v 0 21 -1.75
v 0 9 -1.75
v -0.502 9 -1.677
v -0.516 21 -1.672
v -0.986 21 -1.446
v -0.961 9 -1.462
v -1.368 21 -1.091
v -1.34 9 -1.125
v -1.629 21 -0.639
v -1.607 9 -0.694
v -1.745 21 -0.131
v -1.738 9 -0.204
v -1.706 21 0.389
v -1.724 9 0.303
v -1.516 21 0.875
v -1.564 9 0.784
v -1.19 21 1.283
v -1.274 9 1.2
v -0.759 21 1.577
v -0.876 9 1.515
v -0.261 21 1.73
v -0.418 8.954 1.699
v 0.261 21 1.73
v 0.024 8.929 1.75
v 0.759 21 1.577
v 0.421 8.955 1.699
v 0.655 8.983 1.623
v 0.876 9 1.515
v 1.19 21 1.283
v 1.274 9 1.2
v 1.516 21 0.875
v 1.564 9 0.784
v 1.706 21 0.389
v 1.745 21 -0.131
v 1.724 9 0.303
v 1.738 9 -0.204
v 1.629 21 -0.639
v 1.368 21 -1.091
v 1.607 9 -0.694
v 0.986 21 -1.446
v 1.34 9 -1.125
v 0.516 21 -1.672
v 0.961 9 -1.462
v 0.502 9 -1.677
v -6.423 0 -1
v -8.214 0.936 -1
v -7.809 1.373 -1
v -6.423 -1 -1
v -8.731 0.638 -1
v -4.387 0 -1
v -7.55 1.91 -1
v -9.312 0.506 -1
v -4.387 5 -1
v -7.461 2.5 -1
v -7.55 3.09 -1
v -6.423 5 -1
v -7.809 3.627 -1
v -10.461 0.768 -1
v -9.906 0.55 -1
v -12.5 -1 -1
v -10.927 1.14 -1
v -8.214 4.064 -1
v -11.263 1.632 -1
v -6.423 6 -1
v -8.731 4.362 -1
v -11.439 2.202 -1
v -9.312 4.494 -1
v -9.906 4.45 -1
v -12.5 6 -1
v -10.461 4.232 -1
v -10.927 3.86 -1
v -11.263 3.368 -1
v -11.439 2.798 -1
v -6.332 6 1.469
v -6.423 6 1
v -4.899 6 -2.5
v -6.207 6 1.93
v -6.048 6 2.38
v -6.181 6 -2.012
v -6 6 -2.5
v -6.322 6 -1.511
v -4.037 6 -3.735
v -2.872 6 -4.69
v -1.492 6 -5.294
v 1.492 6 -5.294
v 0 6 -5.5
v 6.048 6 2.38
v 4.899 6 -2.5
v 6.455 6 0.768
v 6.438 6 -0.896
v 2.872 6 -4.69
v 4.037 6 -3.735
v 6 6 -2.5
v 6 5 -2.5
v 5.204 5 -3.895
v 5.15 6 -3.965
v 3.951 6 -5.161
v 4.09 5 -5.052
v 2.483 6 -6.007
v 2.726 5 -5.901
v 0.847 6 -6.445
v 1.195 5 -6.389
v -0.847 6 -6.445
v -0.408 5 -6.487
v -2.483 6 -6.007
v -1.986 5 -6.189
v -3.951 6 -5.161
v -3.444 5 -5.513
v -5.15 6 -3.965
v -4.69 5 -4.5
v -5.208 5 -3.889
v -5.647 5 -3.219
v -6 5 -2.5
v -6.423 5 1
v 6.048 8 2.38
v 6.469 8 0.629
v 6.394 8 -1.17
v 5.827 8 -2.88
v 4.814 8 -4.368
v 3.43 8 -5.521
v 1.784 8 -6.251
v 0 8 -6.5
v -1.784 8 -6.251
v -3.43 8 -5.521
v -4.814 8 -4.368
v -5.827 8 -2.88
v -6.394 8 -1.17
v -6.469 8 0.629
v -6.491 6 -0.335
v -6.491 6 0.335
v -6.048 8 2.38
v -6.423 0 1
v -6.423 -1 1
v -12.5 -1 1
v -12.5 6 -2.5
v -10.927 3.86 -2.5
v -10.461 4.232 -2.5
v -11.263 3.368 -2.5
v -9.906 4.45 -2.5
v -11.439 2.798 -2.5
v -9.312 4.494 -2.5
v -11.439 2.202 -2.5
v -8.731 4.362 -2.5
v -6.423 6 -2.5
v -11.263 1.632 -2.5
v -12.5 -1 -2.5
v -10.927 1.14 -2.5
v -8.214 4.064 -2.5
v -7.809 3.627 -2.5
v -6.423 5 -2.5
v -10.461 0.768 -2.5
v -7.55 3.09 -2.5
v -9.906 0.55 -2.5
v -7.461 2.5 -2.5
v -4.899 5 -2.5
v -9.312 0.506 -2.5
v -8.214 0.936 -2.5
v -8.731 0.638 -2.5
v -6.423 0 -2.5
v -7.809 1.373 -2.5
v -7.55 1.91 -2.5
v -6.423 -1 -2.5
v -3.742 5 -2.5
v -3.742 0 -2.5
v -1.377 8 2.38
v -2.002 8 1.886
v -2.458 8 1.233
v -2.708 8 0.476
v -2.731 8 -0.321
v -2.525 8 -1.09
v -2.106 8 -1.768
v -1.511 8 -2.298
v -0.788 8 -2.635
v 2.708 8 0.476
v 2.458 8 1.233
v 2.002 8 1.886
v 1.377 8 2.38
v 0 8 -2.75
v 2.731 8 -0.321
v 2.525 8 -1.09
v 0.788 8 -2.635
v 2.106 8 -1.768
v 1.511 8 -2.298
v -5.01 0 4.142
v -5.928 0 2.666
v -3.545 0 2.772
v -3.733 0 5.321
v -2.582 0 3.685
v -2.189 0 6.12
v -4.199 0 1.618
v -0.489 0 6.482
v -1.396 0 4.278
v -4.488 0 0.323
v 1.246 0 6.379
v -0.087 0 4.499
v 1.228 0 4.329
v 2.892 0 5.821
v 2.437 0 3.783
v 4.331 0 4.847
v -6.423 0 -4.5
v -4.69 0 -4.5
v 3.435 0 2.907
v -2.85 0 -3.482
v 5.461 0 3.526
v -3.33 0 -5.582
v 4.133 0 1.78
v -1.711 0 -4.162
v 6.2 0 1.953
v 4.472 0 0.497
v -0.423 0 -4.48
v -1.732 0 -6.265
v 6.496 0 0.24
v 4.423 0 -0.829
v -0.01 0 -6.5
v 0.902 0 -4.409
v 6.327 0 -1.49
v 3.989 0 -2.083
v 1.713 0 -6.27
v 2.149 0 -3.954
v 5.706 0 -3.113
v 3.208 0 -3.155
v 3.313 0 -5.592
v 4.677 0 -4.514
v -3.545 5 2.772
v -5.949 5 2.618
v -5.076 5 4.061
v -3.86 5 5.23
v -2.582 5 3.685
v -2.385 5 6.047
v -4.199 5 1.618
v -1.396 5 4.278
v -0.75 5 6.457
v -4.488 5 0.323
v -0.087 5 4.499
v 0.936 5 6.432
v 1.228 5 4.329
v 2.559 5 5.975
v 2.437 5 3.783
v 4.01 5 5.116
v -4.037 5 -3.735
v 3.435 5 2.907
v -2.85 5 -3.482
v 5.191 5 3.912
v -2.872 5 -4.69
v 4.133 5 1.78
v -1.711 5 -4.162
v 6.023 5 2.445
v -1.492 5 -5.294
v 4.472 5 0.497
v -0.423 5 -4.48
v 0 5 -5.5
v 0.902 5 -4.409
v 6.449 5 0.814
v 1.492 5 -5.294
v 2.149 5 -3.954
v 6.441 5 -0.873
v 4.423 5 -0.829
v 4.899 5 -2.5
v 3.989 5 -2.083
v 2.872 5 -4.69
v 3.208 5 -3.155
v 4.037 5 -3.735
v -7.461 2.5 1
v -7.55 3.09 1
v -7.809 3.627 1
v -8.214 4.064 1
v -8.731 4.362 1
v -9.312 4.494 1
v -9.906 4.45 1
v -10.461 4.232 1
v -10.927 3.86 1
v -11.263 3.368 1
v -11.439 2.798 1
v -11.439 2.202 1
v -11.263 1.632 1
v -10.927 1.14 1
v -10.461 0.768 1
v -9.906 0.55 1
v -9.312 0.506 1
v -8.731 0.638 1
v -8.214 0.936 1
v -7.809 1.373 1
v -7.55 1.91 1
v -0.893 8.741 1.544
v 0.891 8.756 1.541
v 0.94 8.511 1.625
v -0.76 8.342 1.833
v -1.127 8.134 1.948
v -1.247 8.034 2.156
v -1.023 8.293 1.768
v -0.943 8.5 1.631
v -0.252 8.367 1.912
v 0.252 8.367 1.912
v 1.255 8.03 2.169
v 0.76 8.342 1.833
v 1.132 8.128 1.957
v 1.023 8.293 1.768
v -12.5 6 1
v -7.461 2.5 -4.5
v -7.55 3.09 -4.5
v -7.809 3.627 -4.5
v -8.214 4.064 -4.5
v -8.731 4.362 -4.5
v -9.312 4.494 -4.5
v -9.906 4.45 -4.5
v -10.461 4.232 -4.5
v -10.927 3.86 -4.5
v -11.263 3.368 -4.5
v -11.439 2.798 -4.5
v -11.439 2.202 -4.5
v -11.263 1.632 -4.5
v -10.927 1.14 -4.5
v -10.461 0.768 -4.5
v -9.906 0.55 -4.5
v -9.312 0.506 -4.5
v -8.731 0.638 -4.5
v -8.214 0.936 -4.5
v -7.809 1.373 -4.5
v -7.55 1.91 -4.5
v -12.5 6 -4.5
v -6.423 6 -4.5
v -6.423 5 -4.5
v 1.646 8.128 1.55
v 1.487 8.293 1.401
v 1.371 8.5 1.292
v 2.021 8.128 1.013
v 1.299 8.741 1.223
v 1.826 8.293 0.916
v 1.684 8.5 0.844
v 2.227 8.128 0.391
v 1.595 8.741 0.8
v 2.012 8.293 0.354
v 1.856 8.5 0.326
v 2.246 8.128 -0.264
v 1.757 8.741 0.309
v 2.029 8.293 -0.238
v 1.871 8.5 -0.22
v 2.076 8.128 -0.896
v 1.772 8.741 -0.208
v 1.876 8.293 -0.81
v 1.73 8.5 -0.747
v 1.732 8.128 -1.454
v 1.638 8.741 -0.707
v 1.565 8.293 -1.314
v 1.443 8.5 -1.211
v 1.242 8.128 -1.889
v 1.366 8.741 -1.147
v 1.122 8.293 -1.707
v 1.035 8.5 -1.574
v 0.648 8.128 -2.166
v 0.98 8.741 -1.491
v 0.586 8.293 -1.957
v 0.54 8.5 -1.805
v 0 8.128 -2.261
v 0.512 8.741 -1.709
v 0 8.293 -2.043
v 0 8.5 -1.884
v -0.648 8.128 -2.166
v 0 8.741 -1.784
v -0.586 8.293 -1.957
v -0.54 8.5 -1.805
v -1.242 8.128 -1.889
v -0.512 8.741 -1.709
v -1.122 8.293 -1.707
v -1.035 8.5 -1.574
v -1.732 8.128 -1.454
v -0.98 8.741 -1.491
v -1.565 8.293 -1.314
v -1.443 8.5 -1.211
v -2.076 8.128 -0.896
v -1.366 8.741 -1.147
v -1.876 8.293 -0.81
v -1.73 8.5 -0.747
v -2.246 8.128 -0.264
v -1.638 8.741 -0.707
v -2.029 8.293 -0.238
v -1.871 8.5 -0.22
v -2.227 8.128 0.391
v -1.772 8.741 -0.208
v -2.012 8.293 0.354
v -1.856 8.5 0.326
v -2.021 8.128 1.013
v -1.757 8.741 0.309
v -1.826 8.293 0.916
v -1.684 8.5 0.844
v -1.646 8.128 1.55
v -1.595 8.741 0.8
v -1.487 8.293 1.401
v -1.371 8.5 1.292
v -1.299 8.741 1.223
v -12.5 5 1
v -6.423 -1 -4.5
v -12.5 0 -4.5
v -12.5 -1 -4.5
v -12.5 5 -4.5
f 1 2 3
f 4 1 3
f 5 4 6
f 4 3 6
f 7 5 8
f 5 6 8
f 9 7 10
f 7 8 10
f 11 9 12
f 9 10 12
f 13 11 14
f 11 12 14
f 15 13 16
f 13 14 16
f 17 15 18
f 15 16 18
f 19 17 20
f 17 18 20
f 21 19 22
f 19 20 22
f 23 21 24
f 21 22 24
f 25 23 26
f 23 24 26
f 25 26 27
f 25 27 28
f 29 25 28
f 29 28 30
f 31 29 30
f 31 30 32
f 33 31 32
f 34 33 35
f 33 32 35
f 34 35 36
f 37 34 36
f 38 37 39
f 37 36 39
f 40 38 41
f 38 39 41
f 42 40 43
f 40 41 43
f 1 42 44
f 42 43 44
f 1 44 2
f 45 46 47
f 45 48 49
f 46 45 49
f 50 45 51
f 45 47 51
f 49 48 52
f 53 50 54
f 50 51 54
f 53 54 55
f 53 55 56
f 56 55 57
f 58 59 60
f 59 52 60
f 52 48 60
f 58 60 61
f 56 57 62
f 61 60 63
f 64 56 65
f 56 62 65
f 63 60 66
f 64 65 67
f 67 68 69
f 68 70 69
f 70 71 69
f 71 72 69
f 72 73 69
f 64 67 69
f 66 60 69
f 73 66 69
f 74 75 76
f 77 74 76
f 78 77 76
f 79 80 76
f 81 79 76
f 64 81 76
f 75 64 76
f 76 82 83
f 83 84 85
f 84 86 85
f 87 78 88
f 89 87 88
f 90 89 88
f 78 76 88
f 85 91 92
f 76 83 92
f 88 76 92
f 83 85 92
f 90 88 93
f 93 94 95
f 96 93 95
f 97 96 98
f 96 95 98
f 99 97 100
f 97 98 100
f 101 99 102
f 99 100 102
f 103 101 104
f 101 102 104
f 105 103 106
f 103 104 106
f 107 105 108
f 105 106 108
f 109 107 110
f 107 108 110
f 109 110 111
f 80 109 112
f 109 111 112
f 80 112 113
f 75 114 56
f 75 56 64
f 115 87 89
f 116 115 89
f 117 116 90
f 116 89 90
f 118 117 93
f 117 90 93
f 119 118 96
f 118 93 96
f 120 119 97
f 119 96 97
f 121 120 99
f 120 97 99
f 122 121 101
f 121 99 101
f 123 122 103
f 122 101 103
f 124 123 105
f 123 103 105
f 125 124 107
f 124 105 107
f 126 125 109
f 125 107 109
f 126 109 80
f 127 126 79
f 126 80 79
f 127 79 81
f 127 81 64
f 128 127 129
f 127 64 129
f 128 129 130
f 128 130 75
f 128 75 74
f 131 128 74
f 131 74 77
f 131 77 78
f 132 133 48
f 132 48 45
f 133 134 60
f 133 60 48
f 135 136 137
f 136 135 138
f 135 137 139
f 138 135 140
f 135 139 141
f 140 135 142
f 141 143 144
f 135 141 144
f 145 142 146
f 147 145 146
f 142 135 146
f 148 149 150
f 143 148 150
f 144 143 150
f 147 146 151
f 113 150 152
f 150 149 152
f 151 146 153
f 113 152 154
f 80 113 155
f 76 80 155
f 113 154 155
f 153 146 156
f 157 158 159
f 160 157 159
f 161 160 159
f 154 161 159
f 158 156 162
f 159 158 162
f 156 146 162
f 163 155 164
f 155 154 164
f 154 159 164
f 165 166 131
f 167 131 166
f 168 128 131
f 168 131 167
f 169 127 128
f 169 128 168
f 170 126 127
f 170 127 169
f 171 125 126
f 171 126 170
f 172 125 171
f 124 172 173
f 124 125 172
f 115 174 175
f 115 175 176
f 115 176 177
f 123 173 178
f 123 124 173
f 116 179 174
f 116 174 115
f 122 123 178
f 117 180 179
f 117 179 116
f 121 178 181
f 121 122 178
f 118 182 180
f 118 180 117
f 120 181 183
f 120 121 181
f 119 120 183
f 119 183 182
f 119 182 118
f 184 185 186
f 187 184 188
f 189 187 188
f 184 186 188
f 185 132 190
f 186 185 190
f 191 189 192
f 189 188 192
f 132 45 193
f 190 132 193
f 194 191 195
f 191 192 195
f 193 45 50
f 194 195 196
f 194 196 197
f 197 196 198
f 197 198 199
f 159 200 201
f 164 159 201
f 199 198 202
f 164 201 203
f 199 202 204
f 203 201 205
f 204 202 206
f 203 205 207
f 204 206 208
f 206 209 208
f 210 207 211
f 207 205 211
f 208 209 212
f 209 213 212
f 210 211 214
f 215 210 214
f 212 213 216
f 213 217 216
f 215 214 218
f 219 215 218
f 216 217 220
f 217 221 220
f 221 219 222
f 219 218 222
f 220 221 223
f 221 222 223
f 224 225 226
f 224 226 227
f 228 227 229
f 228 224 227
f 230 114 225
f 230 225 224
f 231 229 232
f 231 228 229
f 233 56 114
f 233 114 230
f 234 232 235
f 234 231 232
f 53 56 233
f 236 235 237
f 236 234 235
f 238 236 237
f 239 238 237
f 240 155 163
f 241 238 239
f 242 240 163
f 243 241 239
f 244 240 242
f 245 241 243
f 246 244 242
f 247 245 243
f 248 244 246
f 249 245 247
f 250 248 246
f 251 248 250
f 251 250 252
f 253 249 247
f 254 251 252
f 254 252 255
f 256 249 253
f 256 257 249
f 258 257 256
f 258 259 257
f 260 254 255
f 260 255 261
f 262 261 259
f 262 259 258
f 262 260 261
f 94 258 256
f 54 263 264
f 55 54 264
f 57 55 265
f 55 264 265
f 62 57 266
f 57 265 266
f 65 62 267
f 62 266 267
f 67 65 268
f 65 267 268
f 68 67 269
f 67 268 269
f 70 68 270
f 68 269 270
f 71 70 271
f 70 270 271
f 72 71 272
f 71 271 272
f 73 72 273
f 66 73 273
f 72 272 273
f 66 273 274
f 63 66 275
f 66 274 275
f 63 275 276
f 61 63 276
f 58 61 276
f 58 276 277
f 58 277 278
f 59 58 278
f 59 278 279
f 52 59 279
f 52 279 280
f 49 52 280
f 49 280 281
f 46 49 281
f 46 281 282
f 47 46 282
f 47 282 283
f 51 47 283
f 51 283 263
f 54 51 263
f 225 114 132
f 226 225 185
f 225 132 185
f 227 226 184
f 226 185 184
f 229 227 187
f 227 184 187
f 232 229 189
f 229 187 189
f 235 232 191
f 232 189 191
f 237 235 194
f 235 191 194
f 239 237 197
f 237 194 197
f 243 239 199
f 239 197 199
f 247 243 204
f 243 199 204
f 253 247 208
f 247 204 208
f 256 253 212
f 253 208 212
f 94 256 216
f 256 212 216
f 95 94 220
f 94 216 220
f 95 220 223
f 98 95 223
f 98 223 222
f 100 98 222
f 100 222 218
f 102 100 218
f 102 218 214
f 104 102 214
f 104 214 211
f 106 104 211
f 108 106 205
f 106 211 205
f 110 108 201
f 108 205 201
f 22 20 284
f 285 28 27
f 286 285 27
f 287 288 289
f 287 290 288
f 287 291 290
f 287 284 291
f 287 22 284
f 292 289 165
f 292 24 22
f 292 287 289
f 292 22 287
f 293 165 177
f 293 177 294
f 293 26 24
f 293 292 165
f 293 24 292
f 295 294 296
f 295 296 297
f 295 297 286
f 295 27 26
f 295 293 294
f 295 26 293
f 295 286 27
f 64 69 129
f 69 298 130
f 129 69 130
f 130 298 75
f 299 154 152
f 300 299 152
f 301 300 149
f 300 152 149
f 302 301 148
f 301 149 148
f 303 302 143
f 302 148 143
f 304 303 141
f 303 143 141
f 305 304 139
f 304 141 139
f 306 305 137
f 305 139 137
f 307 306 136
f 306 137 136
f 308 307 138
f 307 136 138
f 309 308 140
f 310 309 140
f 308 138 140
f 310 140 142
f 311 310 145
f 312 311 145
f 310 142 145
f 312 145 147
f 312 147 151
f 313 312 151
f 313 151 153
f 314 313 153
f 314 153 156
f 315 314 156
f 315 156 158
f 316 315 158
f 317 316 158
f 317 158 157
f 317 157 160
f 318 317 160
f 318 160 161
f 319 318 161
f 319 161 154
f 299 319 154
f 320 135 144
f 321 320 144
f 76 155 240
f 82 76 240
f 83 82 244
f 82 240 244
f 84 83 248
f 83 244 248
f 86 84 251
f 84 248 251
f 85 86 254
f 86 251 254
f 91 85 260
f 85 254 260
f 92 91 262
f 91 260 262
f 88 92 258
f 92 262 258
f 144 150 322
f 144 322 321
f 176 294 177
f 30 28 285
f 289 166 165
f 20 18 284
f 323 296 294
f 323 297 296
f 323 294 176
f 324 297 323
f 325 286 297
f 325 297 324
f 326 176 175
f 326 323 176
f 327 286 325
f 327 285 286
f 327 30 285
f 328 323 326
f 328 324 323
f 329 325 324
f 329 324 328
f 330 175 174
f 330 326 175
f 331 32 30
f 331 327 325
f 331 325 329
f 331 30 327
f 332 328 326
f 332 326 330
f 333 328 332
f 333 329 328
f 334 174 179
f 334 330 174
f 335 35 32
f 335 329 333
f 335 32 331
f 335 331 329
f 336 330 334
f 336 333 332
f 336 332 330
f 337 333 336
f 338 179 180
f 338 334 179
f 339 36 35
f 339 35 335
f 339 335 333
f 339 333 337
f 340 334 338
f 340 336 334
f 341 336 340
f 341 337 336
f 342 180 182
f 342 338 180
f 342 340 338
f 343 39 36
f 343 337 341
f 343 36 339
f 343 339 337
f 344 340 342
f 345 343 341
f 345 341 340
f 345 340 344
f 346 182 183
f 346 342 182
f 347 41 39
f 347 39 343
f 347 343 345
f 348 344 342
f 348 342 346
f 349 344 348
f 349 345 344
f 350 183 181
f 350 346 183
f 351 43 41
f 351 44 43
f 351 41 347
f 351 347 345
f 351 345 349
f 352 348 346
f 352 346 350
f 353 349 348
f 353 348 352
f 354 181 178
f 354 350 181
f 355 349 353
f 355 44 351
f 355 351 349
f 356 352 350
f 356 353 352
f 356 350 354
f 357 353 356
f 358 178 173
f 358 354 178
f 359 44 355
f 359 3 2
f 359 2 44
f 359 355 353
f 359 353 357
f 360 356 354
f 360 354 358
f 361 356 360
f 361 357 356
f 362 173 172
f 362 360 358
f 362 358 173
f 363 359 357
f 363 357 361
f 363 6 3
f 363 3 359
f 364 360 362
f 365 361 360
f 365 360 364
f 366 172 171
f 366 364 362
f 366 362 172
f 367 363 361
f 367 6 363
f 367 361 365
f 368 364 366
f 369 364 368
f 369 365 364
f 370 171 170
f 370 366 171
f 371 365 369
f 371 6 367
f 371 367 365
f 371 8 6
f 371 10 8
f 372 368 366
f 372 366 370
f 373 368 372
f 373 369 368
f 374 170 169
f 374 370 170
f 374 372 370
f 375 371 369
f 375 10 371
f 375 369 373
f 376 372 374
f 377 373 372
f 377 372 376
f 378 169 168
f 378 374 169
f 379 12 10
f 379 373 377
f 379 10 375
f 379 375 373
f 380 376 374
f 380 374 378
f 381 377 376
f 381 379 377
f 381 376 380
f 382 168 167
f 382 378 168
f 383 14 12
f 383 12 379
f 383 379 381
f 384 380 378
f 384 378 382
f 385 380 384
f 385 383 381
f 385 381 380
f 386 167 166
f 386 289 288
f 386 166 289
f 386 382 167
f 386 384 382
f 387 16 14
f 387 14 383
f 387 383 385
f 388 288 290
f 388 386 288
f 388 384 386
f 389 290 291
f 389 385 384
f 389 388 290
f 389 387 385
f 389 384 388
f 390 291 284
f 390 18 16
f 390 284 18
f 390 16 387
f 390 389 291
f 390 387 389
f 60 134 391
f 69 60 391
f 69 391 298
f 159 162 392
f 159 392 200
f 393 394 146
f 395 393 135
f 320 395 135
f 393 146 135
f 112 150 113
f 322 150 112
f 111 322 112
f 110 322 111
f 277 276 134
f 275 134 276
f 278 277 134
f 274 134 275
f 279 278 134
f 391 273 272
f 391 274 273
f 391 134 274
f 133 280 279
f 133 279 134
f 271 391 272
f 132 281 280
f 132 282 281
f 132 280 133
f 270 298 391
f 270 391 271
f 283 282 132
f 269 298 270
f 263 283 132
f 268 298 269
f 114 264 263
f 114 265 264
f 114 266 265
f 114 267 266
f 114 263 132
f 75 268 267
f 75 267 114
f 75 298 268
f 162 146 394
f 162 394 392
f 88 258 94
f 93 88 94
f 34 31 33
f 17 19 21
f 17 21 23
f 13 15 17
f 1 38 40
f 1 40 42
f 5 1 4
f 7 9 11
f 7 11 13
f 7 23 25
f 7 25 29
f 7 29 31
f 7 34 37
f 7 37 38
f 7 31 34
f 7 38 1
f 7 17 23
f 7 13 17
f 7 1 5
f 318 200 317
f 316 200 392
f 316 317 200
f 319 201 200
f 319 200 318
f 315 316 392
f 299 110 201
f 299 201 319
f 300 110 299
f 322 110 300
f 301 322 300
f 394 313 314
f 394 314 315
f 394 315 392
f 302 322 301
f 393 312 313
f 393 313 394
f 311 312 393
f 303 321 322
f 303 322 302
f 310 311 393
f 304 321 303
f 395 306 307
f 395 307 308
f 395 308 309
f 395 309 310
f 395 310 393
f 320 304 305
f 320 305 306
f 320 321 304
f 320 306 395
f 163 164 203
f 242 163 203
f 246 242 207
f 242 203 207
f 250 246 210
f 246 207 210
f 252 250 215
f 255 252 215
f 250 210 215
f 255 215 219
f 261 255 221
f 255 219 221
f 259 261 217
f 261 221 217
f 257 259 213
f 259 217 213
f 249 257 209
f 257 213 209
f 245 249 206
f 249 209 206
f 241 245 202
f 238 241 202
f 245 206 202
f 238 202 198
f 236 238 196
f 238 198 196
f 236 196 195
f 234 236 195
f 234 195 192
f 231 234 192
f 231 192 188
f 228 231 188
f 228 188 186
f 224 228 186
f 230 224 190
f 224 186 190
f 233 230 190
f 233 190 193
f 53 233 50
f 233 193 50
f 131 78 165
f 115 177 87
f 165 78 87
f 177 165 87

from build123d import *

# Parameters (mm, degrees)
BOSS_EXTRUDE1_DEPTH = 5
BOSS_EXTRUDE2_REACH = 17.411
SKETCH3_W           = 6.077383711
SKETCH3_H           = 1
SKETCH4_W           = 1.5
SKETCH4_H           = 7
CUT_EXTRUDE1_DEPTH  = 10
SKETCH2_R           = 2
CUT_EXTRUDE2_DEPTH  = 10
BOSS_EXTRUDE3_DEPTH = 1
BOSS_EXTRUDE4_DEPTH = 2
SKETCH7_R           = 1.75
BOSS_EXTRUDE5_DEPTH = 13
FILLET1_R           = 1


with BuildPart() as part:
    # Sketch1 → Boss-Extrude1 (new body)
    with BuildSketch(Plane(origin=(0, 0, 0), x_dir=(1, 0, 0), z_dir=(0, 1, 0))):
        with BuildLine():
            Line((-4.69041576, 4.5), (-12.5, 4.5))
            Line((-12.5, 4.5), (-12.5, 2.5))
            Line((-12.5, 2.5), (-3.741657387, 2.5))
            ThreePointArc((-3.741657387, 2.5), (4.133186129, -1.779542756), (-4.387482194, 1))
            Line((-4.387482194, 1), (-12.5, 1))
            Line((-12.5, 1), (-12.5, -1))
            Line((-12.5, -1), (-6.422616289, -1))
            ThreePointArc((-6.422616289, -1), (6.199787926, -1.952595623), (-4.69041576, 4.5))
        make_face()
    extrude(amount=BOSS_EXTRUDE1_DEPTH)

    # Boss-Extrude2: up to this face of the body (flat: up to its plane)
    boss_extrude2_end = Plane(part.part.faces().sort_by_distance((-8.59520788, 2.5, -4.5))[0])
    # Sketch3 → Boss-Extrude2 (add, up to the picked face)
    with BuildSketch(Plane.XY.offset(1), mode=Mode.PRIVATE) as boss_extrude2_sk1:
        with Locations((-9.461308145, 5.5)):
            Rectangle(SKETCH3_W, SKETCH3_H)
    boss_extrude2_tool1 = split(extrude(boss_extrude2_sk1.sketch, amount=-BOSS_EXTRUDE2_REACH, mode=Mode.PRIVATE), bisect_by=boss_extrude2_end, keep=Keep.BOTH, mode=Mode.PRIVATE)
    # Sketch3 → Boss-Extrude2 (add, up to the picked face)
    with BuildSketch(Plane.XY.offset(1), mode=Mode.PRIVATE) as boss_extrude2_sk2:
        with Locations((-9.461308145, -0.5)):
            Rectangle(SKETCH3_W, SKETCH3_H)
    boss_extrude2_tool2 = split(extrude(boss_extrude2_sk2.sketch, amount=-BOSS_EXTRUDE2_REACH, mode=Mode.PRIVATE), bisect_by=boss_extrude2_end, keep=Keep.BOTH, mode=Mode.PRIVATE)
    add(boss_extrude2_tool1.solids().sort_by(Axis((-9.461308, 5.5, 1), (0, 0, -1)))[0])
    add(boss_extrude2_tool2.solids().sort_by(Axis((-9.461308, -0.5, 1), (0, 0, -1)))[0])

    # Sketch4 → Cut-Extrude1 (cut)
    with BuildSketch(Plane.ZY.offset(12.5)):
        with Locations((-1.75, 2.5)):
            Rectangle(SKETCH4_W, SKETCH4_H)
    extrude(amount=-CUT_EXTRUDE1_DEPTH, mode=Mode.SUBTRACT)

    # Sketch2 → Cut-Extrude2 (cut)
    with BuildSketch(Plane.XY.offset(1)):
        with Locations((-9.461308145, 2.5)):
            Circle(SKETCH2_R)
    extrude(amount=-CUT_EXTRUDE2_DEPTH, mode=Mode.SUBTRACT)

    # Sketch5 → Boss-Extrude3 (add)
    with BuildSketch(Plane(origin=(0, 5, 0), x_dir=(1, 0, 0), z_dir=(0, 1, 0))):
        with BuildLine():
            Line((4.898979486, 2.5), (6, 2.5))
            ThreePointArc((6, 2.5), (0, 6.5), (-6, 2.5))
            Line((-6, 2.5), (-4.898979486, 2.5))
            ThreePointArc((-4.898979486, 2.5), (0, 5.5), (4.898979486, 2.5))
        make_face()
    extrude(amount=BOSS_EXTRUDE3_DEPTH)

    # Sketch6 → Boss-Extrude4 (add)
    with BuildSketch(Plane(origin=(0, 6, 0), x_dir=(1, 0, 0), z_dir=(0, 1, 0))):
        with BuildLine():
            Line((-6.048440472, -2.380413381), (6.048440472, -2.380413381))
            ThreePointArc((6.048440472, -2.380413381), (0, 6.5), (-6.048440472, -2.380413381))
        make_face()
    extrude(amount=BOSS_EXTRUDE4_DEPTH)

    # Sketch7 → Boss-Extrude5 (add)
    with BuildSketch(Plane(origin=(0, 8, 0), x_dir=(1, 0, 0), z_dir=(0, 1, 0))):
        with Locations(Location((0, 0, 0), (0, 0, 90))):
            Circle(SKETCH7_R)
    extrude(amount=BOSS_EXTRUDE5_DEPTH)

    # Fillet1
    fillet1_edges = [part.edges().sort_by_distance(p)[0] for p in [
        (0, 8, 1.75),
    ]]
    fillet(fillet1_edges, radius=FILLET1_R)


solid = part.part
